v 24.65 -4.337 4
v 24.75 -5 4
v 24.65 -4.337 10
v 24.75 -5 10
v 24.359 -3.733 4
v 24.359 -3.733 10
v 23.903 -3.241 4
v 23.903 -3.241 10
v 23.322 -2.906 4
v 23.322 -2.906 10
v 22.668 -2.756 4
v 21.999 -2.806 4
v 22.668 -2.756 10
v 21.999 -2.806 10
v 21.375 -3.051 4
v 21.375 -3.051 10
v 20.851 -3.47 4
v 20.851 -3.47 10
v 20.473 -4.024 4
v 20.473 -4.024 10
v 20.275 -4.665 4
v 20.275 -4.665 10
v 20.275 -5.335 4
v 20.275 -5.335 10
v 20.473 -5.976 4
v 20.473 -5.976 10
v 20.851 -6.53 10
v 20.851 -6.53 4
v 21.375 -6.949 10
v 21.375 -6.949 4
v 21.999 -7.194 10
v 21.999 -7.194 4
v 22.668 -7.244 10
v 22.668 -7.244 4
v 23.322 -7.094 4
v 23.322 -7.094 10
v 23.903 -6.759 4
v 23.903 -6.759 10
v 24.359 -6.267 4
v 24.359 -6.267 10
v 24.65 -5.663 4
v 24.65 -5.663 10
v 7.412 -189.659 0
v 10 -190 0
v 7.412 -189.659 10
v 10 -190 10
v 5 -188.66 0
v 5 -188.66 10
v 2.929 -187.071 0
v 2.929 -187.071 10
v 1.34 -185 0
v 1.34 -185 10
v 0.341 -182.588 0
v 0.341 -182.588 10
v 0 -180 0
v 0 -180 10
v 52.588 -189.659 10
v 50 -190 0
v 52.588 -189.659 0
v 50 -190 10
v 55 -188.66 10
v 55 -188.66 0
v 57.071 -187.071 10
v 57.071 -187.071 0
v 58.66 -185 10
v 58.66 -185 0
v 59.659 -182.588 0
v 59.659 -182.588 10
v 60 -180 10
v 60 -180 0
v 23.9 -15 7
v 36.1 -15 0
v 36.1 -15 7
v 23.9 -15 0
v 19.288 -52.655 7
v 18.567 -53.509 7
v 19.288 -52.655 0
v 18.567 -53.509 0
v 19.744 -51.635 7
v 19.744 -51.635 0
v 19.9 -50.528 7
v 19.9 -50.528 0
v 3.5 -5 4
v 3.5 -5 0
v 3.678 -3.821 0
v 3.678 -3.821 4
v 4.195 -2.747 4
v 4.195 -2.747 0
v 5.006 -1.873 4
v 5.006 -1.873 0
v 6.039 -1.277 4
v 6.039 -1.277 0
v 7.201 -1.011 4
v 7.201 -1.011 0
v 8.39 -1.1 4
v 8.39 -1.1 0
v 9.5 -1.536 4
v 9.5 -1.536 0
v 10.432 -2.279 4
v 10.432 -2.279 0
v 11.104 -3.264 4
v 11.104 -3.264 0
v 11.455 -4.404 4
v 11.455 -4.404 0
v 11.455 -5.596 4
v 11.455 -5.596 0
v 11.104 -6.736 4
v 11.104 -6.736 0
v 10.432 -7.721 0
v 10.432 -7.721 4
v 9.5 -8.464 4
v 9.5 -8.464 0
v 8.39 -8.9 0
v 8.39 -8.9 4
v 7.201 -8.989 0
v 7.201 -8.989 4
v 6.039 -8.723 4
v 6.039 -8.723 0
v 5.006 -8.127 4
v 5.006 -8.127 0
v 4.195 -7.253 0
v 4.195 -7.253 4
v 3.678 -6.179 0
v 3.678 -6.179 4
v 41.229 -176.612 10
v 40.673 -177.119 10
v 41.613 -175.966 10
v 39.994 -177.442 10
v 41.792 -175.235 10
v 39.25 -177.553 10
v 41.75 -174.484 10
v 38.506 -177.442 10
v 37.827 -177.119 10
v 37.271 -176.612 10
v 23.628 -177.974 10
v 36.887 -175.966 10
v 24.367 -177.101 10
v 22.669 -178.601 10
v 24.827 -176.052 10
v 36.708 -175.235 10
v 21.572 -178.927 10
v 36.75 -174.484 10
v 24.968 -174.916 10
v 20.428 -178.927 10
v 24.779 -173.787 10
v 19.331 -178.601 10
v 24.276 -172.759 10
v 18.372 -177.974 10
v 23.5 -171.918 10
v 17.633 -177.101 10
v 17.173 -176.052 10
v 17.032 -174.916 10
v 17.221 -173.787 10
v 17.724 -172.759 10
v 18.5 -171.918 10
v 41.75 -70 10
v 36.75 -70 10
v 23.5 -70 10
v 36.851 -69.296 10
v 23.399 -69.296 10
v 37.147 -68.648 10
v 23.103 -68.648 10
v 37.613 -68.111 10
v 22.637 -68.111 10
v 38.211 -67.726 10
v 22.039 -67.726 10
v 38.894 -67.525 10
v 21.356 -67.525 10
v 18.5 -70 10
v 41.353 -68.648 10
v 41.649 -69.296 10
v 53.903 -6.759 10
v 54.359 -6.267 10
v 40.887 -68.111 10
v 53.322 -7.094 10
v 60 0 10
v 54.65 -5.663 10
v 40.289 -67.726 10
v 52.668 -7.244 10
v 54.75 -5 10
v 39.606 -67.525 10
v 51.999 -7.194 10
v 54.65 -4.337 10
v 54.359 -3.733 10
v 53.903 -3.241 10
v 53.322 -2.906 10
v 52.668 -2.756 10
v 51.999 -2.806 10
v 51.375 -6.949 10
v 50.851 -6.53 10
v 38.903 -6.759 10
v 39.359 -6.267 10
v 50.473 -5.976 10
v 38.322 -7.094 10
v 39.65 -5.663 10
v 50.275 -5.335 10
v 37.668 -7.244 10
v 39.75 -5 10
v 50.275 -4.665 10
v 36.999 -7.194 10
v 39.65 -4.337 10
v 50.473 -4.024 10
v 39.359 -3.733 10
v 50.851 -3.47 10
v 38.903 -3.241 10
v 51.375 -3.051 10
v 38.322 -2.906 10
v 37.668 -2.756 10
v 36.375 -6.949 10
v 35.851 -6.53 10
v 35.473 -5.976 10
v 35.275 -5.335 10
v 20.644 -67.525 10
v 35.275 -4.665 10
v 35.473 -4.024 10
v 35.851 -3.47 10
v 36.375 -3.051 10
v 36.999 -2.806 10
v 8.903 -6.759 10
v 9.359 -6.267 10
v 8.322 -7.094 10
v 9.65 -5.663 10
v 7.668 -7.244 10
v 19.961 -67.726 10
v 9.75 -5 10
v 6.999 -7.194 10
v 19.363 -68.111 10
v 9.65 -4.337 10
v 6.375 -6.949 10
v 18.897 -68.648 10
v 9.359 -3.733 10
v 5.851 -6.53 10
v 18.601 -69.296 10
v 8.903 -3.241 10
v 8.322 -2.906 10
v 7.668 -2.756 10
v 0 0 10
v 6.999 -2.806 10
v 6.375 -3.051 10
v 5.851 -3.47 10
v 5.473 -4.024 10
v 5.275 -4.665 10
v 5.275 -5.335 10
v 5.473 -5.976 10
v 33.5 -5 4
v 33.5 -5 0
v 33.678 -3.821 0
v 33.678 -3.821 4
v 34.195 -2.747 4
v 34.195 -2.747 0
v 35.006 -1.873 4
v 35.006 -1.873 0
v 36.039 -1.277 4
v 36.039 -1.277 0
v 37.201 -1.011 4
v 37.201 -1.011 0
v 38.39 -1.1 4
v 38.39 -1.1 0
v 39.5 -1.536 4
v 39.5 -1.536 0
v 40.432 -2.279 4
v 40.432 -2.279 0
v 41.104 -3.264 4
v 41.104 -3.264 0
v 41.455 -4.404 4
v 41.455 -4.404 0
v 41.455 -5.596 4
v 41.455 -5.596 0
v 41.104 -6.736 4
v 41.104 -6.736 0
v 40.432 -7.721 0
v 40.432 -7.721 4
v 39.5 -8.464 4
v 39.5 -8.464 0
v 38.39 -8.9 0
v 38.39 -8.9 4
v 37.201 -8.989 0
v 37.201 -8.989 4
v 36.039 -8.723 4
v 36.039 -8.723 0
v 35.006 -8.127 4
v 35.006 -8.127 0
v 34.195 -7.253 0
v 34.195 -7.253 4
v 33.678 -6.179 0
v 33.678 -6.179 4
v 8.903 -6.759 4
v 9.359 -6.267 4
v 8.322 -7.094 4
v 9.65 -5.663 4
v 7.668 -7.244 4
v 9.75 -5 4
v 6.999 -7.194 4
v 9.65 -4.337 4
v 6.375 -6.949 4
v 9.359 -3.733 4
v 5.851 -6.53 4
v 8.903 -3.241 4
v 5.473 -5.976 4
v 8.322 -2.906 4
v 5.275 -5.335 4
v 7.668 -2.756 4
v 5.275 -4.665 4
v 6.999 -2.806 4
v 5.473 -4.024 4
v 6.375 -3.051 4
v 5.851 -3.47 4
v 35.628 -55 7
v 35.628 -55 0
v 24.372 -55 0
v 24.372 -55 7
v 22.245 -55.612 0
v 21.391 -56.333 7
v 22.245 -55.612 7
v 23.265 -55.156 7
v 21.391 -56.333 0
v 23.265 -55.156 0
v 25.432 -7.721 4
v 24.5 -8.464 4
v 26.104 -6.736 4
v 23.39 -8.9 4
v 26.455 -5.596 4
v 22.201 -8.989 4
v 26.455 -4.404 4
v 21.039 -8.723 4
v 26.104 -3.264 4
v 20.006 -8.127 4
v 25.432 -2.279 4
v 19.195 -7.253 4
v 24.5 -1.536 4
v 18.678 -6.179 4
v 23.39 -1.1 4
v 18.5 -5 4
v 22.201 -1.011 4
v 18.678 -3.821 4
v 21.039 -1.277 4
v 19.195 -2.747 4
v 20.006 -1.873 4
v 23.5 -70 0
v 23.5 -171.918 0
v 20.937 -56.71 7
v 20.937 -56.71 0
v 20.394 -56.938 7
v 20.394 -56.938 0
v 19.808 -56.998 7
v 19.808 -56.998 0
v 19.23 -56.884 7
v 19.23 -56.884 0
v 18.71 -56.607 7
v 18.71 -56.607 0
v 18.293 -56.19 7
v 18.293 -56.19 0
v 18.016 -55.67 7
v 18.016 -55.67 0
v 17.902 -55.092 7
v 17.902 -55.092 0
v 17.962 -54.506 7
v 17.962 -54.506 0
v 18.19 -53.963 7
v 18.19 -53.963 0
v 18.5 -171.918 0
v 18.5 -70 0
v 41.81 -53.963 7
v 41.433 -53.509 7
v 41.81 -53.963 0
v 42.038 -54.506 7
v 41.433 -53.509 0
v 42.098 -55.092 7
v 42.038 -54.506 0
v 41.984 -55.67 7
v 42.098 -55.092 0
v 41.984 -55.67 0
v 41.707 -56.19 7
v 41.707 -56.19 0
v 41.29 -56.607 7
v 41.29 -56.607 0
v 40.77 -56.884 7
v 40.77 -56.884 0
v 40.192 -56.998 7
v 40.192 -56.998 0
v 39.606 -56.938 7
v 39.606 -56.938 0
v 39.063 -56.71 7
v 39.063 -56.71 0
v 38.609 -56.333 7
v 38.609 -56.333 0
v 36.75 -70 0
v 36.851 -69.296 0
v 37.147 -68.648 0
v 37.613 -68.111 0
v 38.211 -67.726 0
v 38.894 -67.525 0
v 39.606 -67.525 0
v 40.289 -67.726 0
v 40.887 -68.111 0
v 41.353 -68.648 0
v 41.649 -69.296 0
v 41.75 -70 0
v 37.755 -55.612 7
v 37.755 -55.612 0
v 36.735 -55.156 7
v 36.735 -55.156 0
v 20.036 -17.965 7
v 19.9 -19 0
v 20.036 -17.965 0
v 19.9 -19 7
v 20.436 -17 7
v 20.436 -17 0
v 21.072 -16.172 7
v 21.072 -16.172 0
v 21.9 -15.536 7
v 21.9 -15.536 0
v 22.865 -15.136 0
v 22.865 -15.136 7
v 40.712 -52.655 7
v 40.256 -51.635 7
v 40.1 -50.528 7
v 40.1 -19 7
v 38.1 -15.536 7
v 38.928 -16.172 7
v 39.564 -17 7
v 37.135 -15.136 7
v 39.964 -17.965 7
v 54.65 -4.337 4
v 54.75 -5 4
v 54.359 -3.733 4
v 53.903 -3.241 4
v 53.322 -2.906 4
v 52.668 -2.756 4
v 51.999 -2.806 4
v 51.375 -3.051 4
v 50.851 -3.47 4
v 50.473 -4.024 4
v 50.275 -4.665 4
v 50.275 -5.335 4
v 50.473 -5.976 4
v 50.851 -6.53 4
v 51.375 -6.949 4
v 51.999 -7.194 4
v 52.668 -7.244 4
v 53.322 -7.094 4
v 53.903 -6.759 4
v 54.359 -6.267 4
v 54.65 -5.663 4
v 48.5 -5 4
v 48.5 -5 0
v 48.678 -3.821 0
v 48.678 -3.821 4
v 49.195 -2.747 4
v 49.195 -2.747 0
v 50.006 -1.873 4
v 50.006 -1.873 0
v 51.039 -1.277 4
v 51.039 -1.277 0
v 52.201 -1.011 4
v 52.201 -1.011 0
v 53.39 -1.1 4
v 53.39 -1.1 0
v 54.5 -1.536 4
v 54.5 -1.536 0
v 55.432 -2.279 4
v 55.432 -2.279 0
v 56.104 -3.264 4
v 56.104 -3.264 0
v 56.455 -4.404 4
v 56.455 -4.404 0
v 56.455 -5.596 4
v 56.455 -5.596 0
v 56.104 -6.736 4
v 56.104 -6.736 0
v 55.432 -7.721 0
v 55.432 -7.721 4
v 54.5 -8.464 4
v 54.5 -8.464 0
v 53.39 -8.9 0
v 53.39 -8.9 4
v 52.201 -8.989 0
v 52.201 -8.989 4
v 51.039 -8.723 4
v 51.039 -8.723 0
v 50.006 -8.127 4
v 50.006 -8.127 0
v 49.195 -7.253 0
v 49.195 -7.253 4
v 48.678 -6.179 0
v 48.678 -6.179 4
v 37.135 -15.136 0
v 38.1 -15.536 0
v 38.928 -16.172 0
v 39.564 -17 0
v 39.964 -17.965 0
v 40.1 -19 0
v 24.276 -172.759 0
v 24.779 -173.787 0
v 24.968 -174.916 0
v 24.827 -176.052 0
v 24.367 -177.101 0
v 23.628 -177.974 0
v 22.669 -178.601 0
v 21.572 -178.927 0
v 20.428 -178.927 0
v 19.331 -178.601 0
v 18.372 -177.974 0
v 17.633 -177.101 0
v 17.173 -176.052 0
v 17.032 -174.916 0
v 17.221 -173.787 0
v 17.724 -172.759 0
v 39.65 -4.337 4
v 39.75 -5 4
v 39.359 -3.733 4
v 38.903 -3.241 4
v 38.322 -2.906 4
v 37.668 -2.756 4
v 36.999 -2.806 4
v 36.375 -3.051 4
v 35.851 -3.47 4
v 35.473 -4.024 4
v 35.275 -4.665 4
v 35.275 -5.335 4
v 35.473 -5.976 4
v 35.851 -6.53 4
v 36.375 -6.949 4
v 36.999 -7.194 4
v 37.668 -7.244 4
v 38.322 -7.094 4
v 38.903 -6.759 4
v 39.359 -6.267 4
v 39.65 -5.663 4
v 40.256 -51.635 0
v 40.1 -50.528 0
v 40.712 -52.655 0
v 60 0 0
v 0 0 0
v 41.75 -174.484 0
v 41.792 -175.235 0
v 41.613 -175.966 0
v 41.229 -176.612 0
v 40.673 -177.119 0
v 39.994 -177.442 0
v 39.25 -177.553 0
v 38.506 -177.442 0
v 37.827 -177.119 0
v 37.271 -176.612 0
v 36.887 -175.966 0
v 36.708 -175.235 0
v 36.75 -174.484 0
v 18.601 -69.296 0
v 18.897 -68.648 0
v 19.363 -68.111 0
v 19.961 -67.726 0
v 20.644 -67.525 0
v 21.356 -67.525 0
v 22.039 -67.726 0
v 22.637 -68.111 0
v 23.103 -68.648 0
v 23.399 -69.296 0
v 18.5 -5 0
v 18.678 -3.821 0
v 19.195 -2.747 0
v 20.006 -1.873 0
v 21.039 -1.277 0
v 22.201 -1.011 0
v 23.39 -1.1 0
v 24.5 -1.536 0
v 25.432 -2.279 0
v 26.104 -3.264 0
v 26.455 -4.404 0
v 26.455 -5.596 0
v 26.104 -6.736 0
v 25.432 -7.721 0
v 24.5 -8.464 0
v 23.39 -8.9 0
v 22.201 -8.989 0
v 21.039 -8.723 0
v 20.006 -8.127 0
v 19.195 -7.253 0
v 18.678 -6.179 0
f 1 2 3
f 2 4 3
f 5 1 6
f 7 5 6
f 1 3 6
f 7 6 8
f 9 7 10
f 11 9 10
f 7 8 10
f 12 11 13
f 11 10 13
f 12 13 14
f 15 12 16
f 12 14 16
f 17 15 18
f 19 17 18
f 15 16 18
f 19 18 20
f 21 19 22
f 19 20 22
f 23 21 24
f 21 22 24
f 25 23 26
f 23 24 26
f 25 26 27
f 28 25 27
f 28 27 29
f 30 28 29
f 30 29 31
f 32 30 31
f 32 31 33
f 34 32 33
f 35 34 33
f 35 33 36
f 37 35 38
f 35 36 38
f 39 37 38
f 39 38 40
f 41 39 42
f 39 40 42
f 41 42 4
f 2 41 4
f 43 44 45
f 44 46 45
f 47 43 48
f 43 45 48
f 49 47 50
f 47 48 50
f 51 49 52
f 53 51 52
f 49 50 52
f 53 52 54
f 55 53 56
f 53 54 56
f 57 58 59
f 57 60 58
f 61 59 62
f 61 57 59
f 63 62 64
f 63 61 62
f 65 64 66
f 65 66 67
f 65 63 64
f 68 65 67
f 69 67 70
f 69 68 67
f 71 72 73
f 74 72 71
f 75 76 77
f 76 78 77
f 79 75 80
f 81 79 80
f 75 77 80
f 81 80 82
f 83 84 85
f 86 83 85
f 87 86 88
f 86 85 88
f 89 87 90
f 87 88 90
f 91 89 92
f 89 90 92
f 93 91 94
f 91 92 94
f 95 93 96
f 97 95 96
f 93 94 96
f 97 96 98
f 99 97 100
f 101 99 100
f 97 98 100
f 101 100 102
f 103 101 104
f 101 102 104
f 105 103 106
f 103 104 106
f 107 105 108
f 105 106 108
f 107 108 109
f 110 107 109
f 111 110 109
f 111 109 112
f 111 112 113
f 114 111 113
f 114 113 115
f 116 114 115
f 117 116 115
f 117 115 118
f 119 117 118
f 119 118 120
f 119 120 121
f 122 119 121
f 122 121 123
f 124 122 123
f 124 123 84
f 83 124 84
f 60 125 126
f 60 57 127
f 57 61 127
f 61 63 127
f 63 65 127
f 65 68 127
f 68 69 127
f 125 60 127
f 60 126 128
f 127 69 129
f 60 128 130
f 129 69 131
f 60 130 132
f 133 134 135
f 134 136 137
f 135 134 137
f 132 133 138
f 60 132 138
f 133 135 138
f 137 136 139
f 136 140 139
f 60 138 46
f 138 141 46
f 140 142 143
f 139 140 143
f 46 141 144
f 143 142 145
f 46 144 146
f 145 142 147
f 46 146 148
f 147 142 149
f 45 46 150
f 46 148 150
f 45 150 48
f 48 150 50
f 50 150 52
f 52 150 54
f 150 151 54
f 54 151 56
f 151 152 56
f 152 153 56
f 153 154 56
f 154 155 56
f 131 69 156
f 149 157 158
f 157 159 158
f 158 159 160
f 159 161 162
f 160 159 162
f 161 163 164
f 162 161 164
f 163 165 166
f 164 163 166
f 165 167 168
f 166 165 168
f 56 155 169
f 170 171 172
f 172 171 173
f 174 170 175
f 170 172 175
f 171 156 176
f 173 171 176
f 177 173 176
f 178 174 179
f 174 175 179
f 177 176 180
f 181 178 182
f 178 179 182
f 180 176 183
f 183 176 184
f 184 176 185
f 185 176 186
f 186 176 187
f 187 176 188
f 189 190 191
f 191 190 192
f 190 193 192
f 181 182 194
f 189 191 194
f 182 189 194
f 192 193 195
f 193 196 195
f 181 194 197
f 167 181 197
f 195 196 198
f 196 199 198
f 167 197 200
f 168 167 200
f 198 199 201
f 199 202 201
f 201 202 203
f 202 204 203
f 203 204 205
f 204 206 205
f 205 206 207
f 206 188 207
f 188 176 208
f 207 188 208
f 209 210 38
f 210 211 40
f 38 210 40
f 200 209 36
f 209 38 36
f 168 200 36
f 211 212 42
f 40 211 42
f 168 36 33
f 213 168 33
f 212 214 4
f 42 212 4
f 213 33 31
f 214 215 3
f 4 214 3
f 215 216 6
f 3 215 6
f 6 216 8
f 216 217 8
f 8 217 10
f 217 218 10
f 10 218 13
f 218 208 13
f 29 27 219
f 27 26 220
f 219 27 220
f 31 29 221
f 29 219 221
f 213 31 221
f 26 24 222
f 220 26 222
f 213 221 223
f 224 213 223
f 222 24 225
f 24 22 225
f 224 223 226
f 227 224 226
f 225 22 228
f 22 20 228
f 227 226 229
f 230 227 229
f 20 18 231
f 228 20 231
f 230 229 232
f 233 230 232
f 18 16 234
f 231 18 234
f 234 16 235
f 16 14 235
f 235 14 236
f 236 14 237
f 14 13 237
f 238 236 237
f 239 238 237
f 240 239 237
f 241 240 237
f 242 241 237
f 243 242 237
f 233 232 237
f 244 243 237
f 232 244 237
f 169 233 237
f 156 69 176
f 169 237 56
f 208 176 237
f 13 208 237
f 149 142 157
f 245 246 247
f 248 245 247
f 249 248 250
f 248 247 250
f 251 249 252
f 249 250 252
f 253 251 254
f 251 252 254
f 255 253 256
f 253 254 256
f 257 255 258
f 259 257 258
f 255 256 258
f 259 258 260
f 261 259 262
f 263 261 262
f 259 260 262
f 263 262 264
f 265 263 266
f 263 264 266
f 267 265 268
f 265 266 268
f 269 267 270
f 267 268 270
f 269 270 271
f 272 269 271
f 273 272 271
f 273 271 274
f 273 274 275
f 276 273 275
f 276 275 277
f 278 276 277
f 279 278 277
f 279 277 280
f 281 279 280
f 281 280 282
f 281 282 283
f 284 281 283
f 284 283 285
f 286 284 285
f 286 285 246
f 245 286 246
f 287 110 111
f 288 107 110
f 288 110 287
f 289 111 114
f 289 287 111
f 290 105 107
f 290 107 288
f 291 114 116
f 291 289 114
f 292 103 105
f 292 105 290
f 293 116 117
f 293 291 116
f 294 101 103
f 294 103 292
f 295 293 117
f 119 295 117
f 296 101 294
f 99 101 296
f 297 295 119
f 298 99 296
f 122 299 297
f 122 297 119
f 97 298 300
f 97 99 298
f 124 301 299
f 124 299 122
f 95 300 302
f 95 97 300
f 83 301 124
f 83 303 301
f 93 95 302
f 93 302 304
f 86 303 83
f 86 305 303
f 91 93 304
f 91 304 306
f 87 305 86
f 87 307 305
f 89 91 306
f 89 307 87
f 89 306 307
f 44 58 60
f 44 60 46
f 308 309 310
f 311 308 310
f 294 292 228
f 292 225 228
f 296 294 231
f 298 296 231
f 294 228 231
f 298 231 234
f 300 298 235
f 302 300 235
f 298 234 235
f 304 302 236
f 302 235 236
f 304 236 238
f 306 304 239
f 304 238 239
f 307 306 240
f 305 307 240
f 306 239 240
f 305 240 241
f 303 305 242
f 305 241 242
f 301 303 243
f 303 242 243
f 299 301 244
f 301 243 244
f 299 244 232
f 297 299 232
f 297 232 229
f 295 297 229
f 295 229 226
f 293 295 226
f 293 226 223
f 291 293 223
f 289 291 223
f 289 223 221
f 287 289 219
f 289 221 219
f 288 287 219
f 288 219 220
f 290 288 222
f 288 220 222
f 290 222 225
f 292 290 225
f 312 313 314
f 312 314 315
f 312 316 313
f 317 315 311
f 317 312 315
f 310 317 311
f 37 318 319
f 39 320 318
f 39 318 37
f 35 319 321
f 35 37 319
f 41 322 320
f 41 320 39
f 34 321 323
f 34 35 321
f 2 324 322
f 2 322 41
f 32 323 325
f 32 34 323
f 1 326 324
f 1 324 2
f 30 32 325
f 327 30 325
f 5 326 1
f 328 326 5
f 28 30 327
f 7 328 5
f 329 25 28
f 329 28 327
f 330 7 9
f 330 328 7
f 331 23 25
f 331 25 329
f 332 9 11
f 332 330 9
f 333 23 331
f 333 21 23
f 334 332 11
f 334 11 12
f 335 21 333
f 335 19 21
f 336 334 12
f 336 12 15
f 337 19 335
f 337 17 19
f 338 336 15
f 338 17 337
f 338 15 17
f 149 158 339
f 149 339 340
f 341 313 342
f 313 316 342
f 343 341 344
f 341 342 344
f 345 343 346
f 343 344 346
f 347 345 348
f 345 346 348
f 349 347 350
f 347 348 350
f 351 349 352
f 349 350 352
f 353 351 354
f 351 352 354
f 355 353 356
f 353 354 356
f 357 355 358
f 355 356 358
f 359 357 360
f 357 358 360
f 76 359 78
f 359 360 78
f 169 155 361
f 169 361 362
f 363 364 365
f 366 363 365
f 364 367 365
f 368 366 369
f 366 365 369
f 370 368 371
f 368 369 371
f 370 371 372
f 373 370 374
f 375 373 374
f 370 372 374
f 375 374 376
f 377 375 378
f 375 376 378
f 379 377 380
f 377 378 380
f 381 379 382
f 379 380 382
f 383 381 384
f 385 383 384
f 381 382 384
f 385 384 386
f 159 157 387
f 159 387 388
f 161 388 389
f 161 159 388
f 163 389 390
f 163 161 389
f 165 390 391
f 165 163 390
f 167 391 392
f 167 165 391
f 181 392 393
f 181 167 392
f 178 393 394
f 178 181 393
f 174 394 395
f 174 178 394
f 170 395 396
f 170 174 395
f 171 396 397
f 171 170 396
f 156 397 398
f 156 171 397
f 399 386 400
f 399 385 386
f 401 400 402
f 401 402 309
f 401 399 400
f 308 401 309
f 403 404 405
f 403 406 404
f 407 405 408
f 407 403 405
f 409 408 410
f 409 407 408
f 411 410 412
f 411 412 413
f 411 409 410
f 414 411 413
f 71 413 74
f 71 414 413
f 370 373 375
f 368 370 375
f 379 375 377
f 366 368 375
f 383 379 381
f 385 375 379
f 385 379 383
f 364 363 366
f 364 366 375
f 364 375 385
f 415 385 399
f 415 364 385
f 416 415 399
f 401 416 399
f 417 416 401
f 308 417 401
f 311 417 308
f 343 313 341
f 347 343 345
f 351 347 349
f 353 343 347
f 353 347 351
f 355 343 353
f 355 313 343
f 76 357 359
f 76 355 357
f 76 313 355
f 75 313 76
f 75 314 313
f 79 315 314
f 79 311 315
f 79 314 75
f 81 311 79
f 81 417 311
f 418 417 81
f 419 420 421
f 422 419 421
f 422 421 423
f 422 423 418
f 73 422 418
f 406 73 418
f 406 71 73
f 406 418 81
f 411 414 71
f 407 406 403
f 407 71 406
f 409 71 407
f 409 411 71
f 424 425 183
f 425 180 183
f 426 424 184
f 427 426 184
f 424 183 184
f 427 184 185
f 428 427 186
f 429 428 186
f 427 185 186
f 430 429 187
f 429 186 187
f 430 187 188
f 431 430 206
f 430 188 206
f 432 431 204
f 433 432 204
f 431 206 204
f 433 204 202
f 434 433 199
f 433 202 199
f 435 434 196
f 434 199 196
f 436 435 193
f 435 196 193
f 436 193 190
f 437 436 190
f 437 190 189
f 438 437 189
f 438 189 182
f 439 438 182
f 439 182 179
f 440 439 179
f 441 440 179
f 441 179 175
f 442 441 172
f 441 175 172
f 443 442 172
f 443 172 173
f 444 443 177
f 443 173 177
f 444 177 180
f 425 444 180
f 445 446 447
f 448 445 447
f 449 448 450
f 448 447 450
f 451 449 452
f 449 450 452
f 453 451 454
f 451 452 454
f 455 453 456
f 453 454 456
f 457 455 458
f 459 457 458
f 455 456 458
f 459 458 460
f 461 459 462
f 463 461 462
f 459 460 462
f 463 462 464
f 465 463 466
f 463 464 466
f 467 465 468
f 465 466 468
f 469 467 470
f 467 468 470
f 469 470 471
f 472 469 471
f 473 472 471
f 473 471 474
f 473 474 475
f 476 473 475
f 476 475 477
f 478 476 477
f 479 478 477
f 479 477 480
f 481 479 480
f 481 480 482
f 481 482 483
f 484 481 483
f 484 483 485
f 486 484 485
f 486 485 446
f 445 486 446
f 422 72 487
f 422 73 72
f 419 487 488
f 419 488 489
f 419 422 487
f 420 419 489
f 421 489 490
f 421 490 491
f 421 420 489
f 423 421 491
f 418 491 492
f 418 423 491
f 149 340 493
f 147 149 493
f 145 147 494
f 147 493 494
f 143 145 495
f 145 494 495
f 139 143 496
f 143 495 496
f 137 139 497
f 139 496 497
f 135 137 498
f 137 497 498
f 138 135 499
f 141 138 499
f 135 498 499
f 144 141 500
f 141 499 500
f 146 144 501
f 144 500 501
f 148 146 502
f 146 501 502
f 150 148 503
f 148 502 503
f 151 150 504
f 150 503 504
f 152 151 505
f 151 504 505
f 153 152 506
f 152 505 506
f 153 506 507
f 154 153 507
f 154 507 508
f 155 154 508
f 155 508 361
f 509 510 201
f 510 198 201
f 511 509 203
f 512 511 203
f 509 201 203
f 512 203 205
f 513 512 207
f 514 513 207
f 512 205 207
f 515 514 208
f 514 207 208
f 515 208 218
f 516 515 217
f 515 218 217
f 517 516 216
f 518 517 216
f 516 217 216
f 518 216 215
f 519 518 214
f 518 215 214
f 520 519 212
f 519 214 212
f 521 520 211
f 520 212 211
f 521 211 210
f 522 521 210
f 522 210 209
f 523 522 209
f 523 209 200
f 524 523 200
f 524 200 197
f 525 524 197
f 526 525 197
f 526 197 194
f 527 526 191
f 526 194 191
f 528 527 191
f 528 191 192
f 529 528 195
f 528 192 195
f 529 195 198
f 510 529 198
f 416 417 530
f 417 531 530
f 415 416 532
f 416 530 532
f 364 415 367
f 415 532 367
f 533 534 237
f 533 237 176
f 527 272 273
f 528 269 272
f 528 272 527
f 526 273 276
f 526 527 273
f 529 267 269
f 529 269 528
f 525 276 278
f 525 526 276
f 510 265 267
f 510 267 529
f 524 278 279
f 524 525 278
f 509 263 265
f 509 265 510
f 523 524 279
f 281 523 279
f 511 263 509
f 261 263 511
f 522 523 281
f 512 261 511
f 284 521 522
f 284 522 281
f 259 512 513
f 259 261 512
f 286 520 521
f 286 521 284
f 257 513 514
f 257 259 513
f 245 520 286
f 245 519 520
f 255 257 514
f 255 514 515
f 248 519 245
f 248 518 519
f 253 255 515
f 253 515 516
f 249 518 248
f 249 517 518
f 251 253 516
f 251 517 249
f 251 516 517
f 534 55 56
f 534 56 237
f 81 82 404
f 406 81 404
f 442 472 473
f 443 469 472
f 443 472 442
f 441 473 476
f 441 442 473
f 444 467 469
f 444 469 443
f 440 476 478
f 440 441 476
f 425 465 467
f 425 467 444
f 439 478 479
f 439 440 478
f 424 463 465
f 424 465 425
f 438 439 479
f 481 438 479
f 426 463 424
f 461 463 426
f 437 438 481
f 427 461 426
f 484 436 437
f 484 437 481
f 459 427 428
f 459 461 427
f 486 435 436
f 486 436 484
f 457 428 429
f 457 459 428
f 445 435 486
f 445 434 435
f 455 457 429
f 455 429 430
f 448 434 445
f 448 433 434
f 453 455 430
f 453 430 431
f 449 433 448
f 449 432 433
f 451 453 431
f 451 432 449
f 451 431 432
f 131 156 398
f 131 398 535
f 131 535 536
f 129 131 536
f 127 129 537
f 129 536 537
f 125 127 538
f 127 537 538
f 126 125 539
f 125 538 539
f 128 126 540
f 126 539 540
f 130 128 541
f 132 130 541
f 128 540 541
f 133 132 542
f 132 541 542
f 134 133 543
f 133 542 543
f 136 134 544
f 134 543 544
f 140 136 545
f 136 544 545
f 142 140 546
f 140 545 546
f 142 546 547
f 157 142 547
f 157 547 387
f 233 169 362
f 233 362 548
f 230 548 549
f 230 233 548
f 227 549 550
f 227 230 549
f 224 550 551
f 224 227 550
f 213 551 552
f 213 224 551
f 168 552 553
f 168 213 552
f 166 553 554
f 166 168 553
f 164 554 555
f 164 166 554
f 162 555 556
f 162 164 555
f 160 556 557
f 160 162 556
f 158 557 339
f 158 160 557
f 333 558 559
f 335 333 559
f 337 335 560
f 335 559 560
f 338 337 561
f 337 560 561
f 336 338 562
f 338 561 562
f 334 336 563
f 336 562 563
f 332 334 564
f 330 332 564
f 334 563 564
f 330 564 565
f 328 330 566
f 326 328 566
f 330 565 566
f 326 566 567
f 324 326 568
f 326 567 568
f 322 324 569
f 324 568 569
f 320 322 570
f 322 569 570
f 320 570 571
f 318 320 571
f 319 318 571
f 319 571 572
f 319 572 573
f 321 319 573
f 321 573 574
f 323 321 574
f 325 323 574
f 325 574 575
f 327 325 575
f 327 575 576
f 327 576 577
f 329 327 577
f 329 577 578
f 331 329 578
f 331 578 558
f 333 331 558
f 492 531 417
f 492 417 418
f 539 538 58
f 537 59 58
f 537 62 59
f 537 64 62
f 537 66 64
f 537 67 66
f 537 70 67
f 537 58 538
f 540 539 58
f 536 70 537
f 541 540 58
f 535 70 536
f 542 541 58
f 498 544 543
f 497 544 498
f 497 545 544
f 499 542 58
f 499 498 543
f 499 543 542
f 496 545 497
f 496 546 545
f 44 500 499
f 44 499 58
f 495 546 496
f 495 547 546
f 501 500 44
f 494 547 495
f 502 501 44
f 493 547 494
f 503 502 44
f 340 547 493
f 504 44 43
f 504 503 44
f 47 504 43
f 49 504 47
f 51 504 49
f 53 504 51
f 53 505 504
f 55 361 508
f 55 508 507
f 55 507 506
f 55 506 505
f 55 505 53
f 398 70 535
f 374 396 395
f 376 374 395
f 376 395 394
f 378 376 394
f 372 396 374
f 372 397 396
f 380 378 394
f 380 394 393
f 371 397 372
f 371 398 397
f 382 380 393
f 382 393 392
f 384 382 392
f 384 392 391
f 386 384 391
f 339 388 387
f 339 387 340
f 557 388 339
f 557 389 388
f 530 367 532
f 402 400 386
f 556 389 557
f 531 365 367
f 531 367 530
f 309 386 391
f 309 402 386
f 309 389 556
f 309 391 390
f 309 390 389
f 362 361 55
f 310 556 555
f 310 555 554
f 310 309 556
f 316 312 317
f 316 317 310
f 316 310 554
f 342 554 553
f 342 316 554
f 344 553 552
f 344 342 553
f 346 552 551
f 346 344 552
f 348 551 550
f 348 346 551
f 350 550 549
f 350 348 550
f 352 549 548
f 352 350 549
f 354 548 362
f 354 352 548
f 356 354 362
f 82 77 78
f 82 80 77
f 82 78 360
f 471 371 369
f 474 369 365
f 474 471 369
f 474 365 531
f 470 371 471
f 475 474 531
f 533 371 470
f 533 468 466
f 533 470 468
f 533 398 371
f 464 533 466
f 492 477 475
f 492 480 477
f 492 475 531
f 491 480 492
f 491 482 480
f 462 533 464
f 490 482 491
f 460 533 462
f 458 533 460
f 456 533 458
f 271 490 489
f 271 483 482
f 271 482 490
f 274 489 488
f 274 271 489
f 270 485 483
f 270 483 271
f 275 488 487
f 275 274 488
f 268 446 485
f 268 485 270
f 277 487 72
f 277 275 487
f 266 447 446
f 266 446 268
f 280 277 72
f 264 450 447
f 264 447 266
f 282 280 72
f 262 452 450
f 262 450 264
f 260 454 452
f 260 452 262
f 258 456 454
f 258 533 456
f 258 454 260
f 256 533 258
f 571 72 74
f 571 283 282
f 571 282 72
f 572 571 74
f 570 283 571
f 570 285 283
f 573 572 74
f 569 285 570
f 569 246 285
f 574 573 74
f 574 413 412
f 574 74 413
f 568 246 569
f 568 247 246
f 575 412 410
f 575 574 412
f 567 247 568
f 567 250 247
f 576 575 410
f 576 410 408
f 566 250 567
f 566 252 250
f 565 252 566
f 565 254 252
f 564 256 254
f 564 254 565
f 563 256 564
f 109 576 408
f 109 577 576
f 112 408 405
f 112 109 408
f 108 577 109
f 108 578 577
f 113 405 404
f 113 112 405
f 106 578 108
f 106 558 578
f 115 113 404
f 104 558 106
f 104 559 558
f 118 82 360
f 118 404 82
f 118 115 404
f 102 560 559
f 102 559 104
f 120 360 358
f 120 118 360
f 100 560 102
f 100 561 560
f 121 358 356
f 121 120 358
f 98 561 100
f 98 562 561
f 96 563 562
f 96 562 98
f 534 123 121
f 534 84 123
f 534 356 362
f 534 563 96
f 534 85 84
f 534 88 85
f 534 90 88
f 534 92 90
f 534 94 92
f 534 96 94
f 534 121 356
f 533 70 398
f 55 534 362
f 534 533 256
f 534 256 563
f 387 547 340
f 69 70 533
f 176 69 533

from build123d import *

# Parameters (mm, degrees)
EXTRUDE_1_DEPTH            = 10
HOLE_WIZARD_M4_D           = 4.5
HOLE_WIZARD_M4_CBORE_D     = 8
HOLE_WIZARD_M4_CBORE_DEPTH = 4
HOLE_WIZARD_1_4_201_D      = 5.1054
HOLE_WIZARD_3_8_161_D      = 7.9375
CUT_EXTRUDE_1_DEPTH        = 200.499373433
FILLET_1_R                 = 10
SKETCH_14_W                = 20.2
SKETCH_14_H                = 40
CUT_EXTRUDE_2_DEPTH        = 7
SKETCH_15_R                = 2
CUT_EXTRUDE_3_DEPTH        = 7
FILLET_2_R                 = 4


with BuildPart() as part:
    # Эскиз1 → Бобышка-Вытянуть1 (new body)
    with BuildSketch(Plane.XY):
        Polygon((0, 0), (60, 0), (60, -60), (60, -150), (60, -190), (0, -190), align=None)
    extrude(amount=EXTRUDE_1_DEPTH)

    # Цековка для винта с внутренним шестигранником M4 (through all)
    with Locations(Plane(origin=(-14.842707118, -41.655134189, 0), x_dir=(-1, 0, 0), z_dir=(0, 0, -1))):
        with Locations((-67.342707118, 36.655134189), (-52.342707118, 36.655134189), (-37.342707118, 36.655134189), (-22.342707118, 36.655134189)):
            CounterBoreHole(HOLE_WIZARD_M4_D / 2, HOLE_WIZARD_M4_CBORE_D / 2, HOLE_WIZARD_M4_CBORE_DEPTH)

    # Отверстие обработанное метчиком 1/4-201 (through all)
    with Locations(Plane(origin=(39.25, -175, 10), x_dir=(1, 0, 0), z_dir=(0, 0, 1))):
        with Locations((0, 0)):
            Hole(HOLE_WIZARD_1_4_201_D / 2)

    # Отверстие обработанное метчиком 3/8-161 (through all)
    with Locations(Plane(origin=(21, -175, 10), x_dir=(1, 0, 0), z_dir=(0, 0, 1))):
        with Locations((0, 0)):
            Hole(HOLE_WIZARD_3_8_161_D / 2)

    # Эскиз12 → Вырез-Вытянуть1 (cut, through all)
    with BuildSketch(Plane.XY.offset(10)):
        with BuildLine():
            Line((36.75, -175), (36.75, -70))
            ThreePointArc((36.75, -70), (39.25, -67.5), (41.75, -70))
            Line((41.75, -70), (41.75, -175))
            ThreePointArc((41.75, -175), (39.25, -177.5), (36.75, -175))
        make_face()
        with BuildLine():
            Line((18.5, -175), (18.5, -70))
            ThreePointArc((18.5, -70), (21, -67.5), (23.5, -70))
            Line((23.5, -70), (23.5, -175))
            ThreePointArc((23.5, -175), (21, -177.5), (18.5, -175))
        make_face()
    extrude(amount=-CUT_EXTRUDE_1_DEPTH, mode=Mode.SUBTRACT)

    # Скругление1
    fillet_1_edges = [part.edges().sort_by_distance(p)[0] for p in [
        (60, -190, 5),
        (0, -190, 5),
    ]]
    fillet(fillet_1_edges, radius=FILLET_1_R)

    # Эскиз14 → Вырез-Вытянуть2 (cut)
    with BuildSketch(Plane(origin=(0, 0, 0), x_dir=(-1, 0, 0), z_dir=(0, 0, -1))):
        with Locations((-30, -35)):
            Rectangle(SKETCH_14_W, SKETCH_14_H)
    extrude(amount=-CUT_EXTRUDE_2_DEPTH, mode=Mode.SUBTRACT)

    # Эскиз15 → Вырез-Вытянуть3 (cut)
    with BuildSketch(Plane(origin=(0, 0, 0), x_dir=(-1, 0, 0), z_dir=(0, 0, -1))):
        with Locations((-40.1, -55)):
            Circle(SKETCH_15_R)
        with Locations((-19.9, -55)):
            Circle(SKETCH_15_R)
    extrude(amount=-CUT_EXTRUDE_3_DEPTH, mode=Mode.SUBTRACT)

    # Скругление2
    fillet_2_edges = [part.edges().sort_by_distance(p)[0] for p in [
        (19.9, -15, 3.5),
        (40.1, -15, 3.5),
        (38.1, -55, 3.5),
        (40.1, -53, 3.5),
        (19.9, -53, 3.5),
        (21.9, -55, 3.5),
    ]]
    fillet(fillet_2_edges, radius=FILLET_2_R)


solid = part.part
